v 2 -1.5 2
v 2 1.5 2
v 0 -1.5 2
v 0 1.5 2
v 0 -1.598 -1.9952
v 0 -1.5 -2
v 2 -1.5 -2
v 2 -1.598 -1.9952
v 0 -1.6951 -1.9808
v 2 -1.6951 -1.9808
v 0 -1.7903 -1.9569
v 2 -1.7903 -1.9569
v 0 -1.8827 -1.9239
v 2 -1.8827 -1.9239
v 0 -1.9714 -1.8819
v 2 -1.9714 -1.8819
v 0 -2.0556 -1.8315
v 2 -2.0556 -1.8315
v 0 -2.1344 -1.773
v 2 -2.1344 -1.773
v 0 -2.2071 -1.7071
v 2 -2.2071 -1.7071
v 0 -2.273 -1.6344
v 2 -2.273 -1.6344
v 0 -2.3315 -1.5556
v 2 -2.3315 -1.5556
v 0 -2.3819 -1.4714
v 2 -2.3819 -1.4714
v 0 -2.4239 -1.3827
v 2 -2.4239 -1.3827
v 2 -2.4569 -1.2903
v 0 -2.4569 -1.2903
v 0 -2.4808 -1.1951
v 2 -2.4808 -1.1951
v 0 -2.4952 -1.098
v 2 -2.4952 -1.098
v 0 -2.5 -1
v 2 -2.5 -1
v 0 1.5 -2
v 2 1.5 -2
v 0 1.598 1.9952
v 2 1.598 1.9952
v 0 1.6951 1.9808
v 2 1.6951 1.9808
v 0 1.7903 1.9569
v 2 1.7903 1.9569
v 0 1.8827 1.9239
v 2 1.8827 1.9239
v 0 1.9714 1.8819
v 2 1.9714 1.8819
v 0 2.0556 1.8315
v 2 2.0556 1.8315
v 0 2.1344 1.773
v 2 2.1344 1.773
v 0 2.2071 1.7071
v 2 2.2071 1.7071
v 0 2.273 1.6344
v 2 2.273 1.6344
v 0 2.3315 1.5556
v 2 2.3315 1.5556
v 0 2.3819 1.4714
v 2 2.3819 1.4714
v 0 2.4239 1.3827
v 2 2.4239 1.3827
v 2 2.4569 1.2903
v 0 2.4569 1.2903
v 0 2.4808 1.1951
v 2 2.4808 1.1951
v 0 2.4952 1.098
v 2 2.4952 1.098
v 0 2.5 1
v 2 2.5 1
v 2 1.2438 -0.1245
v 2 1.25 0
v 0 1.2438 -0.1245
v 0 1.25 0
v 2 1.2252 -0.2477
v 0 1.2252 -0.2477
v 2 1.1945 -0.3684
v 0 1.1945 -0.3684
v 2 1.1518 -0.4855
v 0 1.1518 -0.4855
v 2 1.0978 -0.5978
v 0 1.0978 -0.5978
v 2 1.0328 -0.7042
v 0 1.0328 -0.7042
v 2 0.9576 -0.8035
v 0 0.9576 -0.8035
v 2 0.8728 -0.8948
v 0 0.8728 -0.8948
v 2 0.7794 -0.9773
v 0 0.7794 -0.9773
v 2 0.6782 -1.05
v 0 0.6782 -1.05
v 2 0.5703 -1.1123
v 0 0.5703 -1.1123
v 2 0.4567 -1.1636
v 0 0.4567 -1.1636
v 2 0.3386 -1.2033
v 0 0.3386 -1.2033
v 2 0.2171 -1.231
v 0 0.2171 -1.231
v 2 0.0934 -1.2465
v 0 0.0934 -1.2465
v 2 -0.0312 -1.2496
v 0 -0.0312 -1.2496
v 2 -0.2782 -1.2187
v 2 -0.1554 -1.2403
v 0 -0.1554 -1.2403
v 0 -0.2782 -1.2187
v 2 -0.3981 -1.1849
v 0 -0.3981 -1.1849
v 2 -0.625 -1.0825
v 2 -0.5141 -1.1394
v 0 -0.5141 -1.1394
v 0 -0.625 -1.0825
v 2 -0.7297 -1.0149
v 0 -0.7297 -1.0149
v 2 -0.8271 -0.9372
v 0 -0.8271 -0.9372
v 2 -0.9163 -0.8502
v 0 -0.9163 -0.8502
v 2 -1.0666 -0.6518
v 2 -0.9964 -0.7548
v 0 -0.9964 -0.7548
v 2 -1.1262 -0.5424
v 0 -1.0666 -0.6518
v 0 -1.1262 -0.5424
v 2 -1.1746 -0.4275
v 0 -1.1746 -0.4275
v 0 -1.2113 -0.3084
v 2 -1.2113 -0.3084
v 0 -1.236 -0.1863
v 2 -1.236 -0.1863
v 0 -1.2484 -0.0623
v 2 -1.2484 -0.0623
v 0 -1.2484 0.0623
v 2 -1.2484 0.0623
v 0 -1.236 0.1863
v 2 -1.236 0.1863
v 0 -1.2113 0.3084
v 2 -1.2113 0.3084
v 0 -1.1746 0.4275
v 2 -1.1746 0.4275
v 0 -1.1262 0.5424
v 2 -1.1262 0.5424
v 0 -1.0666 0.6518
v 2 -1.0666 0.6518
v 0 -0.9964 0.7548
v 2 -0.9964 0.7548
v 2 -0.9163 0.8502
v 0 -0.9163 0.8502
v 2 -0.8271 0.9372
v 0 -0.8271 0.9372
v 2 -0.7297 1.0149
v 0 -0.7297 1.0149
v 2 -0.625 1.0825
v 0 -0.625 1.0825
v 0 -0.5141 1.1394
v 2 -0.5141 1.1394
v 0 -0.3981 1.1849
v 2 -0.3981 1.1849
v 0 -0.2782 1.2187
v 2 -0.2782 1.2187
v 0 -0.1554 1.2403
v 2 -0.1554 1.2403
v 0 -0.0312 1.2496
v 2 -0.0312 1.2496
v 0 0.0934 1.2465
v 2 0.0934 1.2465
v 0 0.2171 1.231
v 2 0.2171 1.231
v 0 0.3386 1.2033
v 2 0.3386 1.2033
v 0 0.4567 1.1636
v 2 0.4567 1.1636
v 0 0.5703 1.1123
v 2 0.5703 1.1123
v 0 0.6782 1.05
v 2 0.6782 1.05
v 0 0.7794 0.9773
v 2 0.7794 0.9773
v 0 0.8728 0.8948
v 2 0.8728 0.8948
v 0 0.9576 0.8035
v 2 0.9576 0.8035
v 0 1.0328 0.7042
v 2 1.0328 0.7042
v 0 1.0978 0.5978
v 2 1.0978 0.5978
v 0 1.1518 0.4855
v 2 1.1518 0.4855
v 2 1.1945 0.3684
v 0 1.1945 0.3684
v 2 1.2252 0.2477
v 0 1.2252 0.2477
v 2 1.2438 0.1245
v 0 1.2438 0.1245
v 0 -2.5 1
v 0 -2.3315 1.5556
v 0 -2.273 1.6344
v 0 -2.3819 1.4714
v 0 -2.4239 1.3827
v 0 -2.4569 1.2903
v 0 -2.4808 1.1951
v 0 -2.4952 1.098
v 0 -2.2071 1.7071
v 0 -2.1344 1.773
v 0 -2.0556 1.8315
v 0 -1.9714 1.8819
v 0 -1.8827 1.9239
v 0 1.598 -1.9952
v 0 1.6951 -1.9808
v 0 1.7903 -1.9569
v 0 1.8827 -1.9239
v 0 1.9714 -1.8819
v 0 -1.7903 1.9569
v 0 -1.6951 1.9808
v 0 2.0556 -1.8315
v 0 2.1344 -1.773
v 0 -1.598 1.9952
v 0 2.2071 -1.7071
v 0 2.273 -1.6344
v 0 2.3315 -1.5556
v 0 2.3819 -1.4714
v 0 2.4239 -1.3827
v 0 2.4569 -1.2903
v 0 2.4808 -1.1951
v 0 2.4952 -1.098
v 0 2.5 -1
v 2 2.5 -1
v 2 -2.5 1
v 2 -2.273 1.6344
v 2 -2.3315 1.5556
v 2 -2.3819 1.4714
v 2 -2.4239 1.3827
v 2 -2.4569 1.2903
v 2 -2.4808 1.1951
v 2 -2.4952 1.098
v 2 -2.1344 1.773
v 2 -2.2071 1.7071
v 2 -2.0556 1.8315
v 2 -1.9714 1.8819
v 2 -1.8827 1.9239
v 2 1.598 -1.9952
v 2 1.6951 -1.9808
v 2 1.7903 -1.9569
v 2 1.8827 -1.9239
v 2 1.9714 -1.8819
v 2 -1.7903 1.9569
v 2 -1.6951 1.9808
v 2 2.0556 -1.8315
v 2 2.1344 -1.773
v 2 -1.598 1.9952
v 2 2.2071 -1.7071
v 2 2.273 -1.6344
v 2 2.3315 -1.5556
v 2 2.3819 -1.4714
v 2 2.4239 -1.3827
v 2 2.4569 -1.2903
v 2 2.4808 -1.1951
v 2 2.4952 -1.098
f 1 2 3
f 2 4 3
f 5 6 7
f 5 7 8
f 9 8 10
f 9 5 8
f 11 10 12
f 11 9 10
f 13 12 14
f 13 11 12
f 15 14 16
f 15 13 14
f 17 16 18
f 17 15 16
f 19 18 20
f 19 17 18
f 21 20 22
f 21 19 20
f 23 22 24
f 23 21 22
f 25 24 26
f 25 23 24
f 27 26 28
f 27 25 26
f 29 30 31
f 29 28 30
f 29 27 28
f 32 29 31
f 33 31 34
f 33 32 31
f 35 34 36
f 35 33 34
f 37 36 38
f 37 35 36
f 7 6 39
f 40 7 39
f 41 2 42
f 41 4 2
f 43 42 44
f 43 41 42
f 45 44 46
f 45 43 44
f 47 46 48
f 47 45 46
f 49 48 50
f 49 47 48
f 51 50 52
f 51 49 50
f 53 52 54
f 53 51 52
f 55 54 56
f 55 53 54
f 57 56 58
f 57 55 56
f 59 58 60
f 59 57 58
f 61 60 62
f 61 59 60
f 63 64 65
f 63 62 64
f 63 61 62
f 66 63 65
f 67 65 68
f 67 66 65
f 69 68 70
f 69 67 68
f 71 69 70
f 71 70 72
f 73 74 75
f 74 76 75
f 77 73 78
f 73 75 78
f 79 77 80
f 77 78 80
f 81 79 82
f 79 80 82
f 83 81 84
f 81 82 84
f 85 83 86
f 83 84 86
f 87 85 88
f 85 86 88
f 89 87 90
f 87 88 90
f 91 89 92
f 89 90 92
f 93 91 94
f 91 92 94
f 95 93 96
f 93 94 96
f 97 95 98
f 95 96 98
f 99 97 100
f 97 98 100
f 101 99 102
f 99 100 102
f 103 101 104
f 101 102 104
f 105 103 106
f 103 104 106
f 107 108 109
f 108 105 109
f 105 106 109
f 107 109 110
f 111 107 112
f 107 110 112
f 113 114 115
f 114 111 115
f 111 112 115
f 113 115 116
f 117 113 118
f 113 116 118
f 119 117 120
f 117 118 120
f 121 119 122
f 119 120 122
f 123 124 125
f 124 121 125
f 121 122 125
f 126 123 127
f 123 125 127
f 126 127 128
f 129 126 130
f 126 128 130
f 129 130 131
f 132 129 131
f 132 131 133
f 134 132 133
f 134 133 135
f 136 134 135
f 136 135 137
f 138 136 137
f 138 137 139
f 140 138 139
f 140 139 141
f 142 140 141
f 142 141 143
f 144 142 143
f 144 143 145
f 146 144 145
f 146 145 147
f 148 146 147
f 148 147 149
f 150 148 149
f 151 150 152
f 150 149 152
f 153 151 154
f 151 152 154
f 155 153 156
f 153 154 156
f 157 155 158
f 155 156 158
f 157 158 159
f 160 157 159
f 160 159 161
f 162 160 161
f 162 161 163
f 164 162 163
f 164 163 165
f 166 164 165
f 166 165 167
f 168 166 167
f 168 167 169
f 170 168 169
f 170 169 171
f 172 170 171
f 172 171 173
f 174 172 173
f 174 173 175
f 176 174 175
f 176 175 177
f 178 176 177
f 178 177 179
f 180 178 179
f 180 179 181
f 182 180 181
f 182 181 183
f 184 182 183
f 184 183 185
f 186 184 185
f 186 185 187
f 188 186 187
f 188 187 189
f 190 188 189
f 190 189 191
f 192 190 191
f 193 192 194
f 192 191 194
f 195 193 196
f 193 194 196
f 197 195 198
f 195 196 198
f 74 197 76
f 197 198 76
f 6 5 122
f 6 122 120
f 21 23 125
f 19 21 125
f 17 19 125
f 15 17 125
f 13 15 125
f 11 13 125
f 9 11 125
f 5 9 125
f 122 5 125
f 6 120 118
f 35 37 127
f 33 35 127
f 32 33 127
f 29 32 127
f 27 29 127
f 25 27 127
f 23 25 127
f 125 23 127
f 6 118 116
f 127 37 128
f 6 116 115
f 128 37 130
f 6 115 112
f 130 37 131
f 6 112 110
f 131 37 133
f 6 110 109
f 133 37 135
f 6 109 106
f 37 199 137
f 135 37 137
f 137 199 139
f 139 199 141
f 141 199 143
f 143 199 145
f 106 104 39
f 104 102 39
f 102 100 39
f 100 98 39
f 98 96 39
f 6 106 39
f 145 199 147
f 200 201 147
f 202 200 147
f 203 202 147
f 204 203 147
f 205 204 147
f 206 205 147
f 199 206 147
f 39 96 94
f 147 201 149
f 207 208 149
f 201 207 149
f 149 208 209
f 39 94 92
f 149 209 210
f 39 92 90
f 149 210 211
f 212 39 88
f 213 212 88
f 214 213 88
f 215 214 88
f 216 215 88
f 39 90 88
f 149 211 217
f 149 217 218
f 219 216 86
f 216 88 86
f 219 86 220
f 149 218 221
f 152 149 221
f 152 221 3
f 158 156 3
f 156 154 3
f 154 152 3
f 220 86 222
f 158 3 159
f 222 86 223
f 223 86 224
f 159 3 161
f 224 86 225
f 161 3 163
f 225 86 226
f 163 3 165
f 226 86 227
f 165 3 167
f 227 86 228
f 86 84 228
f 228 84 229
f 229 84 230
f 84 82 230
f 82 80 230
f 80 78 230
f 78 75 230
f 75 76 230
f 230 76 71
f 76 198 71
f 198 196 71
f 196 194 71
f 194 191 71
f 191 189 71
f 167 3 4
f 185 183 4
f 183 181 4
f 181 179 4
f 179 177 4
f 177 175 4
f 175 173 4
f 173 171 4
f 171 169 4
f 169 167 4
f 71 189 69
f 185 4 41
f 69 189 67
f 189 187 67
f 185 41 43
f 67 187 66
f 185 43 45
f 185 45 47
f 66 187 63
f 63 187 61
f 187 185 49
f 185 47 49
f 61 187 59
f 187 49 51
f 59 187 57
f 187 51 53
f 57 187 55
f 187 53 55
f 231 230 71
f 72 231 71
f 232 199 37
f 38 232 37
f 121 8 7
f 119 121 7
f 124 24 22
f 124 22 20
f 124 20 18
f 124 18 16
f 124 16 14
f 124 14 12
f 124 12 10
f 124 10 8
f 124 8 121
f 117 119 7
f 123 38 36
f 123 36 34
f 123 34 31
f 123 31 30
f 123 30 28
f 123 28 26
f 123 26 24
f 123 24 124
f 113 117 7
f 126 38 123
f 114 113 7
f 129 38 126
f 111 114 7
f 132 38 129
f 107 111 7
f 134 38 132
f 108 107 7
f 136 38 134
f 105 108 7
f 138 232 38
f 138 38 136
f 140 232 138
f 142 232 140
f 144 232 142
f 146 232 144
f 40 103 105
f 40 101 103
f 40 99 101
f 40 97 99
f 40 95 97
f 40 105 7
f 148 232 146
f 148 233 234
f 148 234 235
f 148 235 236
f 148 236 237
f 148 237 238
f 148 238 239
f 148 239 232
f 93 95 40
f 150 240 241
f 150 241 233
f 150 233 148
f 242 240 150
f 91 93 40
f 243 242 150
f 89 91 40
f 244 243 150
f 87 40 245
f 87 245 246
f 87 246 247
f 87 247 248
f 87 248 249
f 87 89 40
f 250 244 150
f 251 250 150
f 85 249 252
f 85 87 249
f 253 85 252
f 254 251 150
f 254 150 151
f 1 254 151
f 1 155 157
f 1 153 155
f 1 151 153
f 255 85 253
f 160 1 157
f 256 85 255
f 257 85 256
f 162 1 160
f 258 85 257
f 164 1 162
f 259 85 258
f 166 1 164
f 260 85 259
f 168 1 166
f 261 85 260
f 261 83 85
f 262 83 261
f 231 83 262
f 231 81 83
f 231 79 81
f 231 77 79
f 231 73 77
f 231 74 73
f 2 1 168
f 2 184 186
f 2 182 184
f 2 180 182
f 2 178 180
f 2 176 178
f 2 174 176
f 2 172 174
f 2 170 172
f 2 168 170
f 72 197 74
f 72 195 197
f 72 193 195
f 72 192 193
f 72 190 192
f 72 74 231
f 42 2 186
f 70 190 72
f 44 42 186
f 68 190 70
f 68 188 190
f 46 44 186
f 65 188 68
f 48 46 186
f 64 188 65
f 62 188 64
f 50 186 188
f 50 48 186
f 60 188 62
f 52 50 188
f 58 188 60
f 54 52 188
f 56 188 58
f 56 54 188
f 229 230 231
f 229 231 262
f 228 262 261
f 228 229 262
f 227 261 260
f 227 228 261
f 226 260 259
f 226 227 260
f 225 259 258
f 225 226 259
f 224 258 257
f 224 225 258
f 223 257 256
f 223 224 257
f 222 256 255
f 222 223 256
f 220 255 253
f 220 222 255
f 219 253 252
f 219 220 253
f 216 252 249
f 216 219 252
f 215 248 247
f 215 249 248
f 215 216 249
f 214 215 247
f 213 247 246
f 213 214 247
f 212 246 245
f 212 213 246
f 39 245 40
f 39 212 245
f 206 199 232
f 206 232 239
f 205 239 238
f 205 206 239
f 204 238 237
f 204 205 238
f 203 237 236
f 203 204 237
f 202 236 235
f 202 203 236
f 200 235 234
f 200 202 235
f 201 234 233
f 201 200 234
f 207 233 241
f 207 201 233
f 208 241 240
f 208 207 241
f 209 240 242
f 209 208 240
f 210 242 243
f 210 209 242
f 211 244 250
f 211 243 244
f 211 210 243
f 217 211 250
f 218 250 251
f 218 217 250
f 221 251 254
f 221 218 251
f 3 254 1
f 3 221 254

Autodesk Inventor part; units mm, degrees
ref_plane "YZ Plane" through (0, 0, 0) normal (1, 0, 0) x (0, 1, 0)
ref_plane "XZ Plane" through (0, 0, 0) normal (0, 1, 0) x (-1, 0, 0)
ref_plane "XY Plane" through (0, 0, 0) normal (0, 0, 1) x (1, 0, 0)
sketch "Sketch1" plane through (0, 0, 0) normal (1, 0, 0) x (0, 1, 0)
  line L0 (1.5, 2) -> (-1.5, 2)
  line L1 (-2.5, 1) -> (-2.5, -1)
  line L2 (-1.5, -2) -> (1.5, -2)
  line L3 (2.5, -1) -> (2.5, 1)
  circle A0 centre (0, 0) radius 1.25
  arc A1 (2.5, 1) -> (1.5, 2) centre (1.5, 1) ccw
  arc A2 (1.5, -2) -> (2.5, -1) centre (1.5, -1) ccw
  arc A3 (-1.5, 2) -> (-2.5, 1) centre (-1.5, 1) ccw
  arc A4 (-2.5, -1) -> (-1.5, -2) centre (-1.5, -1) ccw
  point P0 (2.5, 2)
  point P1 (-2.5, 2)
  point P2 (2.5, -2)
  point P3 (2.5, 0)
  point P4 (0, 2)
  dimension "d0" = 4
  dimension "d1" = 5
  dimension "d2" = 2.5
  dimension "d3" = 1
extrude "Extrusion1" add sketch "Sketch1" along normal blind 2
properties part number "Podkladka_2mm"
